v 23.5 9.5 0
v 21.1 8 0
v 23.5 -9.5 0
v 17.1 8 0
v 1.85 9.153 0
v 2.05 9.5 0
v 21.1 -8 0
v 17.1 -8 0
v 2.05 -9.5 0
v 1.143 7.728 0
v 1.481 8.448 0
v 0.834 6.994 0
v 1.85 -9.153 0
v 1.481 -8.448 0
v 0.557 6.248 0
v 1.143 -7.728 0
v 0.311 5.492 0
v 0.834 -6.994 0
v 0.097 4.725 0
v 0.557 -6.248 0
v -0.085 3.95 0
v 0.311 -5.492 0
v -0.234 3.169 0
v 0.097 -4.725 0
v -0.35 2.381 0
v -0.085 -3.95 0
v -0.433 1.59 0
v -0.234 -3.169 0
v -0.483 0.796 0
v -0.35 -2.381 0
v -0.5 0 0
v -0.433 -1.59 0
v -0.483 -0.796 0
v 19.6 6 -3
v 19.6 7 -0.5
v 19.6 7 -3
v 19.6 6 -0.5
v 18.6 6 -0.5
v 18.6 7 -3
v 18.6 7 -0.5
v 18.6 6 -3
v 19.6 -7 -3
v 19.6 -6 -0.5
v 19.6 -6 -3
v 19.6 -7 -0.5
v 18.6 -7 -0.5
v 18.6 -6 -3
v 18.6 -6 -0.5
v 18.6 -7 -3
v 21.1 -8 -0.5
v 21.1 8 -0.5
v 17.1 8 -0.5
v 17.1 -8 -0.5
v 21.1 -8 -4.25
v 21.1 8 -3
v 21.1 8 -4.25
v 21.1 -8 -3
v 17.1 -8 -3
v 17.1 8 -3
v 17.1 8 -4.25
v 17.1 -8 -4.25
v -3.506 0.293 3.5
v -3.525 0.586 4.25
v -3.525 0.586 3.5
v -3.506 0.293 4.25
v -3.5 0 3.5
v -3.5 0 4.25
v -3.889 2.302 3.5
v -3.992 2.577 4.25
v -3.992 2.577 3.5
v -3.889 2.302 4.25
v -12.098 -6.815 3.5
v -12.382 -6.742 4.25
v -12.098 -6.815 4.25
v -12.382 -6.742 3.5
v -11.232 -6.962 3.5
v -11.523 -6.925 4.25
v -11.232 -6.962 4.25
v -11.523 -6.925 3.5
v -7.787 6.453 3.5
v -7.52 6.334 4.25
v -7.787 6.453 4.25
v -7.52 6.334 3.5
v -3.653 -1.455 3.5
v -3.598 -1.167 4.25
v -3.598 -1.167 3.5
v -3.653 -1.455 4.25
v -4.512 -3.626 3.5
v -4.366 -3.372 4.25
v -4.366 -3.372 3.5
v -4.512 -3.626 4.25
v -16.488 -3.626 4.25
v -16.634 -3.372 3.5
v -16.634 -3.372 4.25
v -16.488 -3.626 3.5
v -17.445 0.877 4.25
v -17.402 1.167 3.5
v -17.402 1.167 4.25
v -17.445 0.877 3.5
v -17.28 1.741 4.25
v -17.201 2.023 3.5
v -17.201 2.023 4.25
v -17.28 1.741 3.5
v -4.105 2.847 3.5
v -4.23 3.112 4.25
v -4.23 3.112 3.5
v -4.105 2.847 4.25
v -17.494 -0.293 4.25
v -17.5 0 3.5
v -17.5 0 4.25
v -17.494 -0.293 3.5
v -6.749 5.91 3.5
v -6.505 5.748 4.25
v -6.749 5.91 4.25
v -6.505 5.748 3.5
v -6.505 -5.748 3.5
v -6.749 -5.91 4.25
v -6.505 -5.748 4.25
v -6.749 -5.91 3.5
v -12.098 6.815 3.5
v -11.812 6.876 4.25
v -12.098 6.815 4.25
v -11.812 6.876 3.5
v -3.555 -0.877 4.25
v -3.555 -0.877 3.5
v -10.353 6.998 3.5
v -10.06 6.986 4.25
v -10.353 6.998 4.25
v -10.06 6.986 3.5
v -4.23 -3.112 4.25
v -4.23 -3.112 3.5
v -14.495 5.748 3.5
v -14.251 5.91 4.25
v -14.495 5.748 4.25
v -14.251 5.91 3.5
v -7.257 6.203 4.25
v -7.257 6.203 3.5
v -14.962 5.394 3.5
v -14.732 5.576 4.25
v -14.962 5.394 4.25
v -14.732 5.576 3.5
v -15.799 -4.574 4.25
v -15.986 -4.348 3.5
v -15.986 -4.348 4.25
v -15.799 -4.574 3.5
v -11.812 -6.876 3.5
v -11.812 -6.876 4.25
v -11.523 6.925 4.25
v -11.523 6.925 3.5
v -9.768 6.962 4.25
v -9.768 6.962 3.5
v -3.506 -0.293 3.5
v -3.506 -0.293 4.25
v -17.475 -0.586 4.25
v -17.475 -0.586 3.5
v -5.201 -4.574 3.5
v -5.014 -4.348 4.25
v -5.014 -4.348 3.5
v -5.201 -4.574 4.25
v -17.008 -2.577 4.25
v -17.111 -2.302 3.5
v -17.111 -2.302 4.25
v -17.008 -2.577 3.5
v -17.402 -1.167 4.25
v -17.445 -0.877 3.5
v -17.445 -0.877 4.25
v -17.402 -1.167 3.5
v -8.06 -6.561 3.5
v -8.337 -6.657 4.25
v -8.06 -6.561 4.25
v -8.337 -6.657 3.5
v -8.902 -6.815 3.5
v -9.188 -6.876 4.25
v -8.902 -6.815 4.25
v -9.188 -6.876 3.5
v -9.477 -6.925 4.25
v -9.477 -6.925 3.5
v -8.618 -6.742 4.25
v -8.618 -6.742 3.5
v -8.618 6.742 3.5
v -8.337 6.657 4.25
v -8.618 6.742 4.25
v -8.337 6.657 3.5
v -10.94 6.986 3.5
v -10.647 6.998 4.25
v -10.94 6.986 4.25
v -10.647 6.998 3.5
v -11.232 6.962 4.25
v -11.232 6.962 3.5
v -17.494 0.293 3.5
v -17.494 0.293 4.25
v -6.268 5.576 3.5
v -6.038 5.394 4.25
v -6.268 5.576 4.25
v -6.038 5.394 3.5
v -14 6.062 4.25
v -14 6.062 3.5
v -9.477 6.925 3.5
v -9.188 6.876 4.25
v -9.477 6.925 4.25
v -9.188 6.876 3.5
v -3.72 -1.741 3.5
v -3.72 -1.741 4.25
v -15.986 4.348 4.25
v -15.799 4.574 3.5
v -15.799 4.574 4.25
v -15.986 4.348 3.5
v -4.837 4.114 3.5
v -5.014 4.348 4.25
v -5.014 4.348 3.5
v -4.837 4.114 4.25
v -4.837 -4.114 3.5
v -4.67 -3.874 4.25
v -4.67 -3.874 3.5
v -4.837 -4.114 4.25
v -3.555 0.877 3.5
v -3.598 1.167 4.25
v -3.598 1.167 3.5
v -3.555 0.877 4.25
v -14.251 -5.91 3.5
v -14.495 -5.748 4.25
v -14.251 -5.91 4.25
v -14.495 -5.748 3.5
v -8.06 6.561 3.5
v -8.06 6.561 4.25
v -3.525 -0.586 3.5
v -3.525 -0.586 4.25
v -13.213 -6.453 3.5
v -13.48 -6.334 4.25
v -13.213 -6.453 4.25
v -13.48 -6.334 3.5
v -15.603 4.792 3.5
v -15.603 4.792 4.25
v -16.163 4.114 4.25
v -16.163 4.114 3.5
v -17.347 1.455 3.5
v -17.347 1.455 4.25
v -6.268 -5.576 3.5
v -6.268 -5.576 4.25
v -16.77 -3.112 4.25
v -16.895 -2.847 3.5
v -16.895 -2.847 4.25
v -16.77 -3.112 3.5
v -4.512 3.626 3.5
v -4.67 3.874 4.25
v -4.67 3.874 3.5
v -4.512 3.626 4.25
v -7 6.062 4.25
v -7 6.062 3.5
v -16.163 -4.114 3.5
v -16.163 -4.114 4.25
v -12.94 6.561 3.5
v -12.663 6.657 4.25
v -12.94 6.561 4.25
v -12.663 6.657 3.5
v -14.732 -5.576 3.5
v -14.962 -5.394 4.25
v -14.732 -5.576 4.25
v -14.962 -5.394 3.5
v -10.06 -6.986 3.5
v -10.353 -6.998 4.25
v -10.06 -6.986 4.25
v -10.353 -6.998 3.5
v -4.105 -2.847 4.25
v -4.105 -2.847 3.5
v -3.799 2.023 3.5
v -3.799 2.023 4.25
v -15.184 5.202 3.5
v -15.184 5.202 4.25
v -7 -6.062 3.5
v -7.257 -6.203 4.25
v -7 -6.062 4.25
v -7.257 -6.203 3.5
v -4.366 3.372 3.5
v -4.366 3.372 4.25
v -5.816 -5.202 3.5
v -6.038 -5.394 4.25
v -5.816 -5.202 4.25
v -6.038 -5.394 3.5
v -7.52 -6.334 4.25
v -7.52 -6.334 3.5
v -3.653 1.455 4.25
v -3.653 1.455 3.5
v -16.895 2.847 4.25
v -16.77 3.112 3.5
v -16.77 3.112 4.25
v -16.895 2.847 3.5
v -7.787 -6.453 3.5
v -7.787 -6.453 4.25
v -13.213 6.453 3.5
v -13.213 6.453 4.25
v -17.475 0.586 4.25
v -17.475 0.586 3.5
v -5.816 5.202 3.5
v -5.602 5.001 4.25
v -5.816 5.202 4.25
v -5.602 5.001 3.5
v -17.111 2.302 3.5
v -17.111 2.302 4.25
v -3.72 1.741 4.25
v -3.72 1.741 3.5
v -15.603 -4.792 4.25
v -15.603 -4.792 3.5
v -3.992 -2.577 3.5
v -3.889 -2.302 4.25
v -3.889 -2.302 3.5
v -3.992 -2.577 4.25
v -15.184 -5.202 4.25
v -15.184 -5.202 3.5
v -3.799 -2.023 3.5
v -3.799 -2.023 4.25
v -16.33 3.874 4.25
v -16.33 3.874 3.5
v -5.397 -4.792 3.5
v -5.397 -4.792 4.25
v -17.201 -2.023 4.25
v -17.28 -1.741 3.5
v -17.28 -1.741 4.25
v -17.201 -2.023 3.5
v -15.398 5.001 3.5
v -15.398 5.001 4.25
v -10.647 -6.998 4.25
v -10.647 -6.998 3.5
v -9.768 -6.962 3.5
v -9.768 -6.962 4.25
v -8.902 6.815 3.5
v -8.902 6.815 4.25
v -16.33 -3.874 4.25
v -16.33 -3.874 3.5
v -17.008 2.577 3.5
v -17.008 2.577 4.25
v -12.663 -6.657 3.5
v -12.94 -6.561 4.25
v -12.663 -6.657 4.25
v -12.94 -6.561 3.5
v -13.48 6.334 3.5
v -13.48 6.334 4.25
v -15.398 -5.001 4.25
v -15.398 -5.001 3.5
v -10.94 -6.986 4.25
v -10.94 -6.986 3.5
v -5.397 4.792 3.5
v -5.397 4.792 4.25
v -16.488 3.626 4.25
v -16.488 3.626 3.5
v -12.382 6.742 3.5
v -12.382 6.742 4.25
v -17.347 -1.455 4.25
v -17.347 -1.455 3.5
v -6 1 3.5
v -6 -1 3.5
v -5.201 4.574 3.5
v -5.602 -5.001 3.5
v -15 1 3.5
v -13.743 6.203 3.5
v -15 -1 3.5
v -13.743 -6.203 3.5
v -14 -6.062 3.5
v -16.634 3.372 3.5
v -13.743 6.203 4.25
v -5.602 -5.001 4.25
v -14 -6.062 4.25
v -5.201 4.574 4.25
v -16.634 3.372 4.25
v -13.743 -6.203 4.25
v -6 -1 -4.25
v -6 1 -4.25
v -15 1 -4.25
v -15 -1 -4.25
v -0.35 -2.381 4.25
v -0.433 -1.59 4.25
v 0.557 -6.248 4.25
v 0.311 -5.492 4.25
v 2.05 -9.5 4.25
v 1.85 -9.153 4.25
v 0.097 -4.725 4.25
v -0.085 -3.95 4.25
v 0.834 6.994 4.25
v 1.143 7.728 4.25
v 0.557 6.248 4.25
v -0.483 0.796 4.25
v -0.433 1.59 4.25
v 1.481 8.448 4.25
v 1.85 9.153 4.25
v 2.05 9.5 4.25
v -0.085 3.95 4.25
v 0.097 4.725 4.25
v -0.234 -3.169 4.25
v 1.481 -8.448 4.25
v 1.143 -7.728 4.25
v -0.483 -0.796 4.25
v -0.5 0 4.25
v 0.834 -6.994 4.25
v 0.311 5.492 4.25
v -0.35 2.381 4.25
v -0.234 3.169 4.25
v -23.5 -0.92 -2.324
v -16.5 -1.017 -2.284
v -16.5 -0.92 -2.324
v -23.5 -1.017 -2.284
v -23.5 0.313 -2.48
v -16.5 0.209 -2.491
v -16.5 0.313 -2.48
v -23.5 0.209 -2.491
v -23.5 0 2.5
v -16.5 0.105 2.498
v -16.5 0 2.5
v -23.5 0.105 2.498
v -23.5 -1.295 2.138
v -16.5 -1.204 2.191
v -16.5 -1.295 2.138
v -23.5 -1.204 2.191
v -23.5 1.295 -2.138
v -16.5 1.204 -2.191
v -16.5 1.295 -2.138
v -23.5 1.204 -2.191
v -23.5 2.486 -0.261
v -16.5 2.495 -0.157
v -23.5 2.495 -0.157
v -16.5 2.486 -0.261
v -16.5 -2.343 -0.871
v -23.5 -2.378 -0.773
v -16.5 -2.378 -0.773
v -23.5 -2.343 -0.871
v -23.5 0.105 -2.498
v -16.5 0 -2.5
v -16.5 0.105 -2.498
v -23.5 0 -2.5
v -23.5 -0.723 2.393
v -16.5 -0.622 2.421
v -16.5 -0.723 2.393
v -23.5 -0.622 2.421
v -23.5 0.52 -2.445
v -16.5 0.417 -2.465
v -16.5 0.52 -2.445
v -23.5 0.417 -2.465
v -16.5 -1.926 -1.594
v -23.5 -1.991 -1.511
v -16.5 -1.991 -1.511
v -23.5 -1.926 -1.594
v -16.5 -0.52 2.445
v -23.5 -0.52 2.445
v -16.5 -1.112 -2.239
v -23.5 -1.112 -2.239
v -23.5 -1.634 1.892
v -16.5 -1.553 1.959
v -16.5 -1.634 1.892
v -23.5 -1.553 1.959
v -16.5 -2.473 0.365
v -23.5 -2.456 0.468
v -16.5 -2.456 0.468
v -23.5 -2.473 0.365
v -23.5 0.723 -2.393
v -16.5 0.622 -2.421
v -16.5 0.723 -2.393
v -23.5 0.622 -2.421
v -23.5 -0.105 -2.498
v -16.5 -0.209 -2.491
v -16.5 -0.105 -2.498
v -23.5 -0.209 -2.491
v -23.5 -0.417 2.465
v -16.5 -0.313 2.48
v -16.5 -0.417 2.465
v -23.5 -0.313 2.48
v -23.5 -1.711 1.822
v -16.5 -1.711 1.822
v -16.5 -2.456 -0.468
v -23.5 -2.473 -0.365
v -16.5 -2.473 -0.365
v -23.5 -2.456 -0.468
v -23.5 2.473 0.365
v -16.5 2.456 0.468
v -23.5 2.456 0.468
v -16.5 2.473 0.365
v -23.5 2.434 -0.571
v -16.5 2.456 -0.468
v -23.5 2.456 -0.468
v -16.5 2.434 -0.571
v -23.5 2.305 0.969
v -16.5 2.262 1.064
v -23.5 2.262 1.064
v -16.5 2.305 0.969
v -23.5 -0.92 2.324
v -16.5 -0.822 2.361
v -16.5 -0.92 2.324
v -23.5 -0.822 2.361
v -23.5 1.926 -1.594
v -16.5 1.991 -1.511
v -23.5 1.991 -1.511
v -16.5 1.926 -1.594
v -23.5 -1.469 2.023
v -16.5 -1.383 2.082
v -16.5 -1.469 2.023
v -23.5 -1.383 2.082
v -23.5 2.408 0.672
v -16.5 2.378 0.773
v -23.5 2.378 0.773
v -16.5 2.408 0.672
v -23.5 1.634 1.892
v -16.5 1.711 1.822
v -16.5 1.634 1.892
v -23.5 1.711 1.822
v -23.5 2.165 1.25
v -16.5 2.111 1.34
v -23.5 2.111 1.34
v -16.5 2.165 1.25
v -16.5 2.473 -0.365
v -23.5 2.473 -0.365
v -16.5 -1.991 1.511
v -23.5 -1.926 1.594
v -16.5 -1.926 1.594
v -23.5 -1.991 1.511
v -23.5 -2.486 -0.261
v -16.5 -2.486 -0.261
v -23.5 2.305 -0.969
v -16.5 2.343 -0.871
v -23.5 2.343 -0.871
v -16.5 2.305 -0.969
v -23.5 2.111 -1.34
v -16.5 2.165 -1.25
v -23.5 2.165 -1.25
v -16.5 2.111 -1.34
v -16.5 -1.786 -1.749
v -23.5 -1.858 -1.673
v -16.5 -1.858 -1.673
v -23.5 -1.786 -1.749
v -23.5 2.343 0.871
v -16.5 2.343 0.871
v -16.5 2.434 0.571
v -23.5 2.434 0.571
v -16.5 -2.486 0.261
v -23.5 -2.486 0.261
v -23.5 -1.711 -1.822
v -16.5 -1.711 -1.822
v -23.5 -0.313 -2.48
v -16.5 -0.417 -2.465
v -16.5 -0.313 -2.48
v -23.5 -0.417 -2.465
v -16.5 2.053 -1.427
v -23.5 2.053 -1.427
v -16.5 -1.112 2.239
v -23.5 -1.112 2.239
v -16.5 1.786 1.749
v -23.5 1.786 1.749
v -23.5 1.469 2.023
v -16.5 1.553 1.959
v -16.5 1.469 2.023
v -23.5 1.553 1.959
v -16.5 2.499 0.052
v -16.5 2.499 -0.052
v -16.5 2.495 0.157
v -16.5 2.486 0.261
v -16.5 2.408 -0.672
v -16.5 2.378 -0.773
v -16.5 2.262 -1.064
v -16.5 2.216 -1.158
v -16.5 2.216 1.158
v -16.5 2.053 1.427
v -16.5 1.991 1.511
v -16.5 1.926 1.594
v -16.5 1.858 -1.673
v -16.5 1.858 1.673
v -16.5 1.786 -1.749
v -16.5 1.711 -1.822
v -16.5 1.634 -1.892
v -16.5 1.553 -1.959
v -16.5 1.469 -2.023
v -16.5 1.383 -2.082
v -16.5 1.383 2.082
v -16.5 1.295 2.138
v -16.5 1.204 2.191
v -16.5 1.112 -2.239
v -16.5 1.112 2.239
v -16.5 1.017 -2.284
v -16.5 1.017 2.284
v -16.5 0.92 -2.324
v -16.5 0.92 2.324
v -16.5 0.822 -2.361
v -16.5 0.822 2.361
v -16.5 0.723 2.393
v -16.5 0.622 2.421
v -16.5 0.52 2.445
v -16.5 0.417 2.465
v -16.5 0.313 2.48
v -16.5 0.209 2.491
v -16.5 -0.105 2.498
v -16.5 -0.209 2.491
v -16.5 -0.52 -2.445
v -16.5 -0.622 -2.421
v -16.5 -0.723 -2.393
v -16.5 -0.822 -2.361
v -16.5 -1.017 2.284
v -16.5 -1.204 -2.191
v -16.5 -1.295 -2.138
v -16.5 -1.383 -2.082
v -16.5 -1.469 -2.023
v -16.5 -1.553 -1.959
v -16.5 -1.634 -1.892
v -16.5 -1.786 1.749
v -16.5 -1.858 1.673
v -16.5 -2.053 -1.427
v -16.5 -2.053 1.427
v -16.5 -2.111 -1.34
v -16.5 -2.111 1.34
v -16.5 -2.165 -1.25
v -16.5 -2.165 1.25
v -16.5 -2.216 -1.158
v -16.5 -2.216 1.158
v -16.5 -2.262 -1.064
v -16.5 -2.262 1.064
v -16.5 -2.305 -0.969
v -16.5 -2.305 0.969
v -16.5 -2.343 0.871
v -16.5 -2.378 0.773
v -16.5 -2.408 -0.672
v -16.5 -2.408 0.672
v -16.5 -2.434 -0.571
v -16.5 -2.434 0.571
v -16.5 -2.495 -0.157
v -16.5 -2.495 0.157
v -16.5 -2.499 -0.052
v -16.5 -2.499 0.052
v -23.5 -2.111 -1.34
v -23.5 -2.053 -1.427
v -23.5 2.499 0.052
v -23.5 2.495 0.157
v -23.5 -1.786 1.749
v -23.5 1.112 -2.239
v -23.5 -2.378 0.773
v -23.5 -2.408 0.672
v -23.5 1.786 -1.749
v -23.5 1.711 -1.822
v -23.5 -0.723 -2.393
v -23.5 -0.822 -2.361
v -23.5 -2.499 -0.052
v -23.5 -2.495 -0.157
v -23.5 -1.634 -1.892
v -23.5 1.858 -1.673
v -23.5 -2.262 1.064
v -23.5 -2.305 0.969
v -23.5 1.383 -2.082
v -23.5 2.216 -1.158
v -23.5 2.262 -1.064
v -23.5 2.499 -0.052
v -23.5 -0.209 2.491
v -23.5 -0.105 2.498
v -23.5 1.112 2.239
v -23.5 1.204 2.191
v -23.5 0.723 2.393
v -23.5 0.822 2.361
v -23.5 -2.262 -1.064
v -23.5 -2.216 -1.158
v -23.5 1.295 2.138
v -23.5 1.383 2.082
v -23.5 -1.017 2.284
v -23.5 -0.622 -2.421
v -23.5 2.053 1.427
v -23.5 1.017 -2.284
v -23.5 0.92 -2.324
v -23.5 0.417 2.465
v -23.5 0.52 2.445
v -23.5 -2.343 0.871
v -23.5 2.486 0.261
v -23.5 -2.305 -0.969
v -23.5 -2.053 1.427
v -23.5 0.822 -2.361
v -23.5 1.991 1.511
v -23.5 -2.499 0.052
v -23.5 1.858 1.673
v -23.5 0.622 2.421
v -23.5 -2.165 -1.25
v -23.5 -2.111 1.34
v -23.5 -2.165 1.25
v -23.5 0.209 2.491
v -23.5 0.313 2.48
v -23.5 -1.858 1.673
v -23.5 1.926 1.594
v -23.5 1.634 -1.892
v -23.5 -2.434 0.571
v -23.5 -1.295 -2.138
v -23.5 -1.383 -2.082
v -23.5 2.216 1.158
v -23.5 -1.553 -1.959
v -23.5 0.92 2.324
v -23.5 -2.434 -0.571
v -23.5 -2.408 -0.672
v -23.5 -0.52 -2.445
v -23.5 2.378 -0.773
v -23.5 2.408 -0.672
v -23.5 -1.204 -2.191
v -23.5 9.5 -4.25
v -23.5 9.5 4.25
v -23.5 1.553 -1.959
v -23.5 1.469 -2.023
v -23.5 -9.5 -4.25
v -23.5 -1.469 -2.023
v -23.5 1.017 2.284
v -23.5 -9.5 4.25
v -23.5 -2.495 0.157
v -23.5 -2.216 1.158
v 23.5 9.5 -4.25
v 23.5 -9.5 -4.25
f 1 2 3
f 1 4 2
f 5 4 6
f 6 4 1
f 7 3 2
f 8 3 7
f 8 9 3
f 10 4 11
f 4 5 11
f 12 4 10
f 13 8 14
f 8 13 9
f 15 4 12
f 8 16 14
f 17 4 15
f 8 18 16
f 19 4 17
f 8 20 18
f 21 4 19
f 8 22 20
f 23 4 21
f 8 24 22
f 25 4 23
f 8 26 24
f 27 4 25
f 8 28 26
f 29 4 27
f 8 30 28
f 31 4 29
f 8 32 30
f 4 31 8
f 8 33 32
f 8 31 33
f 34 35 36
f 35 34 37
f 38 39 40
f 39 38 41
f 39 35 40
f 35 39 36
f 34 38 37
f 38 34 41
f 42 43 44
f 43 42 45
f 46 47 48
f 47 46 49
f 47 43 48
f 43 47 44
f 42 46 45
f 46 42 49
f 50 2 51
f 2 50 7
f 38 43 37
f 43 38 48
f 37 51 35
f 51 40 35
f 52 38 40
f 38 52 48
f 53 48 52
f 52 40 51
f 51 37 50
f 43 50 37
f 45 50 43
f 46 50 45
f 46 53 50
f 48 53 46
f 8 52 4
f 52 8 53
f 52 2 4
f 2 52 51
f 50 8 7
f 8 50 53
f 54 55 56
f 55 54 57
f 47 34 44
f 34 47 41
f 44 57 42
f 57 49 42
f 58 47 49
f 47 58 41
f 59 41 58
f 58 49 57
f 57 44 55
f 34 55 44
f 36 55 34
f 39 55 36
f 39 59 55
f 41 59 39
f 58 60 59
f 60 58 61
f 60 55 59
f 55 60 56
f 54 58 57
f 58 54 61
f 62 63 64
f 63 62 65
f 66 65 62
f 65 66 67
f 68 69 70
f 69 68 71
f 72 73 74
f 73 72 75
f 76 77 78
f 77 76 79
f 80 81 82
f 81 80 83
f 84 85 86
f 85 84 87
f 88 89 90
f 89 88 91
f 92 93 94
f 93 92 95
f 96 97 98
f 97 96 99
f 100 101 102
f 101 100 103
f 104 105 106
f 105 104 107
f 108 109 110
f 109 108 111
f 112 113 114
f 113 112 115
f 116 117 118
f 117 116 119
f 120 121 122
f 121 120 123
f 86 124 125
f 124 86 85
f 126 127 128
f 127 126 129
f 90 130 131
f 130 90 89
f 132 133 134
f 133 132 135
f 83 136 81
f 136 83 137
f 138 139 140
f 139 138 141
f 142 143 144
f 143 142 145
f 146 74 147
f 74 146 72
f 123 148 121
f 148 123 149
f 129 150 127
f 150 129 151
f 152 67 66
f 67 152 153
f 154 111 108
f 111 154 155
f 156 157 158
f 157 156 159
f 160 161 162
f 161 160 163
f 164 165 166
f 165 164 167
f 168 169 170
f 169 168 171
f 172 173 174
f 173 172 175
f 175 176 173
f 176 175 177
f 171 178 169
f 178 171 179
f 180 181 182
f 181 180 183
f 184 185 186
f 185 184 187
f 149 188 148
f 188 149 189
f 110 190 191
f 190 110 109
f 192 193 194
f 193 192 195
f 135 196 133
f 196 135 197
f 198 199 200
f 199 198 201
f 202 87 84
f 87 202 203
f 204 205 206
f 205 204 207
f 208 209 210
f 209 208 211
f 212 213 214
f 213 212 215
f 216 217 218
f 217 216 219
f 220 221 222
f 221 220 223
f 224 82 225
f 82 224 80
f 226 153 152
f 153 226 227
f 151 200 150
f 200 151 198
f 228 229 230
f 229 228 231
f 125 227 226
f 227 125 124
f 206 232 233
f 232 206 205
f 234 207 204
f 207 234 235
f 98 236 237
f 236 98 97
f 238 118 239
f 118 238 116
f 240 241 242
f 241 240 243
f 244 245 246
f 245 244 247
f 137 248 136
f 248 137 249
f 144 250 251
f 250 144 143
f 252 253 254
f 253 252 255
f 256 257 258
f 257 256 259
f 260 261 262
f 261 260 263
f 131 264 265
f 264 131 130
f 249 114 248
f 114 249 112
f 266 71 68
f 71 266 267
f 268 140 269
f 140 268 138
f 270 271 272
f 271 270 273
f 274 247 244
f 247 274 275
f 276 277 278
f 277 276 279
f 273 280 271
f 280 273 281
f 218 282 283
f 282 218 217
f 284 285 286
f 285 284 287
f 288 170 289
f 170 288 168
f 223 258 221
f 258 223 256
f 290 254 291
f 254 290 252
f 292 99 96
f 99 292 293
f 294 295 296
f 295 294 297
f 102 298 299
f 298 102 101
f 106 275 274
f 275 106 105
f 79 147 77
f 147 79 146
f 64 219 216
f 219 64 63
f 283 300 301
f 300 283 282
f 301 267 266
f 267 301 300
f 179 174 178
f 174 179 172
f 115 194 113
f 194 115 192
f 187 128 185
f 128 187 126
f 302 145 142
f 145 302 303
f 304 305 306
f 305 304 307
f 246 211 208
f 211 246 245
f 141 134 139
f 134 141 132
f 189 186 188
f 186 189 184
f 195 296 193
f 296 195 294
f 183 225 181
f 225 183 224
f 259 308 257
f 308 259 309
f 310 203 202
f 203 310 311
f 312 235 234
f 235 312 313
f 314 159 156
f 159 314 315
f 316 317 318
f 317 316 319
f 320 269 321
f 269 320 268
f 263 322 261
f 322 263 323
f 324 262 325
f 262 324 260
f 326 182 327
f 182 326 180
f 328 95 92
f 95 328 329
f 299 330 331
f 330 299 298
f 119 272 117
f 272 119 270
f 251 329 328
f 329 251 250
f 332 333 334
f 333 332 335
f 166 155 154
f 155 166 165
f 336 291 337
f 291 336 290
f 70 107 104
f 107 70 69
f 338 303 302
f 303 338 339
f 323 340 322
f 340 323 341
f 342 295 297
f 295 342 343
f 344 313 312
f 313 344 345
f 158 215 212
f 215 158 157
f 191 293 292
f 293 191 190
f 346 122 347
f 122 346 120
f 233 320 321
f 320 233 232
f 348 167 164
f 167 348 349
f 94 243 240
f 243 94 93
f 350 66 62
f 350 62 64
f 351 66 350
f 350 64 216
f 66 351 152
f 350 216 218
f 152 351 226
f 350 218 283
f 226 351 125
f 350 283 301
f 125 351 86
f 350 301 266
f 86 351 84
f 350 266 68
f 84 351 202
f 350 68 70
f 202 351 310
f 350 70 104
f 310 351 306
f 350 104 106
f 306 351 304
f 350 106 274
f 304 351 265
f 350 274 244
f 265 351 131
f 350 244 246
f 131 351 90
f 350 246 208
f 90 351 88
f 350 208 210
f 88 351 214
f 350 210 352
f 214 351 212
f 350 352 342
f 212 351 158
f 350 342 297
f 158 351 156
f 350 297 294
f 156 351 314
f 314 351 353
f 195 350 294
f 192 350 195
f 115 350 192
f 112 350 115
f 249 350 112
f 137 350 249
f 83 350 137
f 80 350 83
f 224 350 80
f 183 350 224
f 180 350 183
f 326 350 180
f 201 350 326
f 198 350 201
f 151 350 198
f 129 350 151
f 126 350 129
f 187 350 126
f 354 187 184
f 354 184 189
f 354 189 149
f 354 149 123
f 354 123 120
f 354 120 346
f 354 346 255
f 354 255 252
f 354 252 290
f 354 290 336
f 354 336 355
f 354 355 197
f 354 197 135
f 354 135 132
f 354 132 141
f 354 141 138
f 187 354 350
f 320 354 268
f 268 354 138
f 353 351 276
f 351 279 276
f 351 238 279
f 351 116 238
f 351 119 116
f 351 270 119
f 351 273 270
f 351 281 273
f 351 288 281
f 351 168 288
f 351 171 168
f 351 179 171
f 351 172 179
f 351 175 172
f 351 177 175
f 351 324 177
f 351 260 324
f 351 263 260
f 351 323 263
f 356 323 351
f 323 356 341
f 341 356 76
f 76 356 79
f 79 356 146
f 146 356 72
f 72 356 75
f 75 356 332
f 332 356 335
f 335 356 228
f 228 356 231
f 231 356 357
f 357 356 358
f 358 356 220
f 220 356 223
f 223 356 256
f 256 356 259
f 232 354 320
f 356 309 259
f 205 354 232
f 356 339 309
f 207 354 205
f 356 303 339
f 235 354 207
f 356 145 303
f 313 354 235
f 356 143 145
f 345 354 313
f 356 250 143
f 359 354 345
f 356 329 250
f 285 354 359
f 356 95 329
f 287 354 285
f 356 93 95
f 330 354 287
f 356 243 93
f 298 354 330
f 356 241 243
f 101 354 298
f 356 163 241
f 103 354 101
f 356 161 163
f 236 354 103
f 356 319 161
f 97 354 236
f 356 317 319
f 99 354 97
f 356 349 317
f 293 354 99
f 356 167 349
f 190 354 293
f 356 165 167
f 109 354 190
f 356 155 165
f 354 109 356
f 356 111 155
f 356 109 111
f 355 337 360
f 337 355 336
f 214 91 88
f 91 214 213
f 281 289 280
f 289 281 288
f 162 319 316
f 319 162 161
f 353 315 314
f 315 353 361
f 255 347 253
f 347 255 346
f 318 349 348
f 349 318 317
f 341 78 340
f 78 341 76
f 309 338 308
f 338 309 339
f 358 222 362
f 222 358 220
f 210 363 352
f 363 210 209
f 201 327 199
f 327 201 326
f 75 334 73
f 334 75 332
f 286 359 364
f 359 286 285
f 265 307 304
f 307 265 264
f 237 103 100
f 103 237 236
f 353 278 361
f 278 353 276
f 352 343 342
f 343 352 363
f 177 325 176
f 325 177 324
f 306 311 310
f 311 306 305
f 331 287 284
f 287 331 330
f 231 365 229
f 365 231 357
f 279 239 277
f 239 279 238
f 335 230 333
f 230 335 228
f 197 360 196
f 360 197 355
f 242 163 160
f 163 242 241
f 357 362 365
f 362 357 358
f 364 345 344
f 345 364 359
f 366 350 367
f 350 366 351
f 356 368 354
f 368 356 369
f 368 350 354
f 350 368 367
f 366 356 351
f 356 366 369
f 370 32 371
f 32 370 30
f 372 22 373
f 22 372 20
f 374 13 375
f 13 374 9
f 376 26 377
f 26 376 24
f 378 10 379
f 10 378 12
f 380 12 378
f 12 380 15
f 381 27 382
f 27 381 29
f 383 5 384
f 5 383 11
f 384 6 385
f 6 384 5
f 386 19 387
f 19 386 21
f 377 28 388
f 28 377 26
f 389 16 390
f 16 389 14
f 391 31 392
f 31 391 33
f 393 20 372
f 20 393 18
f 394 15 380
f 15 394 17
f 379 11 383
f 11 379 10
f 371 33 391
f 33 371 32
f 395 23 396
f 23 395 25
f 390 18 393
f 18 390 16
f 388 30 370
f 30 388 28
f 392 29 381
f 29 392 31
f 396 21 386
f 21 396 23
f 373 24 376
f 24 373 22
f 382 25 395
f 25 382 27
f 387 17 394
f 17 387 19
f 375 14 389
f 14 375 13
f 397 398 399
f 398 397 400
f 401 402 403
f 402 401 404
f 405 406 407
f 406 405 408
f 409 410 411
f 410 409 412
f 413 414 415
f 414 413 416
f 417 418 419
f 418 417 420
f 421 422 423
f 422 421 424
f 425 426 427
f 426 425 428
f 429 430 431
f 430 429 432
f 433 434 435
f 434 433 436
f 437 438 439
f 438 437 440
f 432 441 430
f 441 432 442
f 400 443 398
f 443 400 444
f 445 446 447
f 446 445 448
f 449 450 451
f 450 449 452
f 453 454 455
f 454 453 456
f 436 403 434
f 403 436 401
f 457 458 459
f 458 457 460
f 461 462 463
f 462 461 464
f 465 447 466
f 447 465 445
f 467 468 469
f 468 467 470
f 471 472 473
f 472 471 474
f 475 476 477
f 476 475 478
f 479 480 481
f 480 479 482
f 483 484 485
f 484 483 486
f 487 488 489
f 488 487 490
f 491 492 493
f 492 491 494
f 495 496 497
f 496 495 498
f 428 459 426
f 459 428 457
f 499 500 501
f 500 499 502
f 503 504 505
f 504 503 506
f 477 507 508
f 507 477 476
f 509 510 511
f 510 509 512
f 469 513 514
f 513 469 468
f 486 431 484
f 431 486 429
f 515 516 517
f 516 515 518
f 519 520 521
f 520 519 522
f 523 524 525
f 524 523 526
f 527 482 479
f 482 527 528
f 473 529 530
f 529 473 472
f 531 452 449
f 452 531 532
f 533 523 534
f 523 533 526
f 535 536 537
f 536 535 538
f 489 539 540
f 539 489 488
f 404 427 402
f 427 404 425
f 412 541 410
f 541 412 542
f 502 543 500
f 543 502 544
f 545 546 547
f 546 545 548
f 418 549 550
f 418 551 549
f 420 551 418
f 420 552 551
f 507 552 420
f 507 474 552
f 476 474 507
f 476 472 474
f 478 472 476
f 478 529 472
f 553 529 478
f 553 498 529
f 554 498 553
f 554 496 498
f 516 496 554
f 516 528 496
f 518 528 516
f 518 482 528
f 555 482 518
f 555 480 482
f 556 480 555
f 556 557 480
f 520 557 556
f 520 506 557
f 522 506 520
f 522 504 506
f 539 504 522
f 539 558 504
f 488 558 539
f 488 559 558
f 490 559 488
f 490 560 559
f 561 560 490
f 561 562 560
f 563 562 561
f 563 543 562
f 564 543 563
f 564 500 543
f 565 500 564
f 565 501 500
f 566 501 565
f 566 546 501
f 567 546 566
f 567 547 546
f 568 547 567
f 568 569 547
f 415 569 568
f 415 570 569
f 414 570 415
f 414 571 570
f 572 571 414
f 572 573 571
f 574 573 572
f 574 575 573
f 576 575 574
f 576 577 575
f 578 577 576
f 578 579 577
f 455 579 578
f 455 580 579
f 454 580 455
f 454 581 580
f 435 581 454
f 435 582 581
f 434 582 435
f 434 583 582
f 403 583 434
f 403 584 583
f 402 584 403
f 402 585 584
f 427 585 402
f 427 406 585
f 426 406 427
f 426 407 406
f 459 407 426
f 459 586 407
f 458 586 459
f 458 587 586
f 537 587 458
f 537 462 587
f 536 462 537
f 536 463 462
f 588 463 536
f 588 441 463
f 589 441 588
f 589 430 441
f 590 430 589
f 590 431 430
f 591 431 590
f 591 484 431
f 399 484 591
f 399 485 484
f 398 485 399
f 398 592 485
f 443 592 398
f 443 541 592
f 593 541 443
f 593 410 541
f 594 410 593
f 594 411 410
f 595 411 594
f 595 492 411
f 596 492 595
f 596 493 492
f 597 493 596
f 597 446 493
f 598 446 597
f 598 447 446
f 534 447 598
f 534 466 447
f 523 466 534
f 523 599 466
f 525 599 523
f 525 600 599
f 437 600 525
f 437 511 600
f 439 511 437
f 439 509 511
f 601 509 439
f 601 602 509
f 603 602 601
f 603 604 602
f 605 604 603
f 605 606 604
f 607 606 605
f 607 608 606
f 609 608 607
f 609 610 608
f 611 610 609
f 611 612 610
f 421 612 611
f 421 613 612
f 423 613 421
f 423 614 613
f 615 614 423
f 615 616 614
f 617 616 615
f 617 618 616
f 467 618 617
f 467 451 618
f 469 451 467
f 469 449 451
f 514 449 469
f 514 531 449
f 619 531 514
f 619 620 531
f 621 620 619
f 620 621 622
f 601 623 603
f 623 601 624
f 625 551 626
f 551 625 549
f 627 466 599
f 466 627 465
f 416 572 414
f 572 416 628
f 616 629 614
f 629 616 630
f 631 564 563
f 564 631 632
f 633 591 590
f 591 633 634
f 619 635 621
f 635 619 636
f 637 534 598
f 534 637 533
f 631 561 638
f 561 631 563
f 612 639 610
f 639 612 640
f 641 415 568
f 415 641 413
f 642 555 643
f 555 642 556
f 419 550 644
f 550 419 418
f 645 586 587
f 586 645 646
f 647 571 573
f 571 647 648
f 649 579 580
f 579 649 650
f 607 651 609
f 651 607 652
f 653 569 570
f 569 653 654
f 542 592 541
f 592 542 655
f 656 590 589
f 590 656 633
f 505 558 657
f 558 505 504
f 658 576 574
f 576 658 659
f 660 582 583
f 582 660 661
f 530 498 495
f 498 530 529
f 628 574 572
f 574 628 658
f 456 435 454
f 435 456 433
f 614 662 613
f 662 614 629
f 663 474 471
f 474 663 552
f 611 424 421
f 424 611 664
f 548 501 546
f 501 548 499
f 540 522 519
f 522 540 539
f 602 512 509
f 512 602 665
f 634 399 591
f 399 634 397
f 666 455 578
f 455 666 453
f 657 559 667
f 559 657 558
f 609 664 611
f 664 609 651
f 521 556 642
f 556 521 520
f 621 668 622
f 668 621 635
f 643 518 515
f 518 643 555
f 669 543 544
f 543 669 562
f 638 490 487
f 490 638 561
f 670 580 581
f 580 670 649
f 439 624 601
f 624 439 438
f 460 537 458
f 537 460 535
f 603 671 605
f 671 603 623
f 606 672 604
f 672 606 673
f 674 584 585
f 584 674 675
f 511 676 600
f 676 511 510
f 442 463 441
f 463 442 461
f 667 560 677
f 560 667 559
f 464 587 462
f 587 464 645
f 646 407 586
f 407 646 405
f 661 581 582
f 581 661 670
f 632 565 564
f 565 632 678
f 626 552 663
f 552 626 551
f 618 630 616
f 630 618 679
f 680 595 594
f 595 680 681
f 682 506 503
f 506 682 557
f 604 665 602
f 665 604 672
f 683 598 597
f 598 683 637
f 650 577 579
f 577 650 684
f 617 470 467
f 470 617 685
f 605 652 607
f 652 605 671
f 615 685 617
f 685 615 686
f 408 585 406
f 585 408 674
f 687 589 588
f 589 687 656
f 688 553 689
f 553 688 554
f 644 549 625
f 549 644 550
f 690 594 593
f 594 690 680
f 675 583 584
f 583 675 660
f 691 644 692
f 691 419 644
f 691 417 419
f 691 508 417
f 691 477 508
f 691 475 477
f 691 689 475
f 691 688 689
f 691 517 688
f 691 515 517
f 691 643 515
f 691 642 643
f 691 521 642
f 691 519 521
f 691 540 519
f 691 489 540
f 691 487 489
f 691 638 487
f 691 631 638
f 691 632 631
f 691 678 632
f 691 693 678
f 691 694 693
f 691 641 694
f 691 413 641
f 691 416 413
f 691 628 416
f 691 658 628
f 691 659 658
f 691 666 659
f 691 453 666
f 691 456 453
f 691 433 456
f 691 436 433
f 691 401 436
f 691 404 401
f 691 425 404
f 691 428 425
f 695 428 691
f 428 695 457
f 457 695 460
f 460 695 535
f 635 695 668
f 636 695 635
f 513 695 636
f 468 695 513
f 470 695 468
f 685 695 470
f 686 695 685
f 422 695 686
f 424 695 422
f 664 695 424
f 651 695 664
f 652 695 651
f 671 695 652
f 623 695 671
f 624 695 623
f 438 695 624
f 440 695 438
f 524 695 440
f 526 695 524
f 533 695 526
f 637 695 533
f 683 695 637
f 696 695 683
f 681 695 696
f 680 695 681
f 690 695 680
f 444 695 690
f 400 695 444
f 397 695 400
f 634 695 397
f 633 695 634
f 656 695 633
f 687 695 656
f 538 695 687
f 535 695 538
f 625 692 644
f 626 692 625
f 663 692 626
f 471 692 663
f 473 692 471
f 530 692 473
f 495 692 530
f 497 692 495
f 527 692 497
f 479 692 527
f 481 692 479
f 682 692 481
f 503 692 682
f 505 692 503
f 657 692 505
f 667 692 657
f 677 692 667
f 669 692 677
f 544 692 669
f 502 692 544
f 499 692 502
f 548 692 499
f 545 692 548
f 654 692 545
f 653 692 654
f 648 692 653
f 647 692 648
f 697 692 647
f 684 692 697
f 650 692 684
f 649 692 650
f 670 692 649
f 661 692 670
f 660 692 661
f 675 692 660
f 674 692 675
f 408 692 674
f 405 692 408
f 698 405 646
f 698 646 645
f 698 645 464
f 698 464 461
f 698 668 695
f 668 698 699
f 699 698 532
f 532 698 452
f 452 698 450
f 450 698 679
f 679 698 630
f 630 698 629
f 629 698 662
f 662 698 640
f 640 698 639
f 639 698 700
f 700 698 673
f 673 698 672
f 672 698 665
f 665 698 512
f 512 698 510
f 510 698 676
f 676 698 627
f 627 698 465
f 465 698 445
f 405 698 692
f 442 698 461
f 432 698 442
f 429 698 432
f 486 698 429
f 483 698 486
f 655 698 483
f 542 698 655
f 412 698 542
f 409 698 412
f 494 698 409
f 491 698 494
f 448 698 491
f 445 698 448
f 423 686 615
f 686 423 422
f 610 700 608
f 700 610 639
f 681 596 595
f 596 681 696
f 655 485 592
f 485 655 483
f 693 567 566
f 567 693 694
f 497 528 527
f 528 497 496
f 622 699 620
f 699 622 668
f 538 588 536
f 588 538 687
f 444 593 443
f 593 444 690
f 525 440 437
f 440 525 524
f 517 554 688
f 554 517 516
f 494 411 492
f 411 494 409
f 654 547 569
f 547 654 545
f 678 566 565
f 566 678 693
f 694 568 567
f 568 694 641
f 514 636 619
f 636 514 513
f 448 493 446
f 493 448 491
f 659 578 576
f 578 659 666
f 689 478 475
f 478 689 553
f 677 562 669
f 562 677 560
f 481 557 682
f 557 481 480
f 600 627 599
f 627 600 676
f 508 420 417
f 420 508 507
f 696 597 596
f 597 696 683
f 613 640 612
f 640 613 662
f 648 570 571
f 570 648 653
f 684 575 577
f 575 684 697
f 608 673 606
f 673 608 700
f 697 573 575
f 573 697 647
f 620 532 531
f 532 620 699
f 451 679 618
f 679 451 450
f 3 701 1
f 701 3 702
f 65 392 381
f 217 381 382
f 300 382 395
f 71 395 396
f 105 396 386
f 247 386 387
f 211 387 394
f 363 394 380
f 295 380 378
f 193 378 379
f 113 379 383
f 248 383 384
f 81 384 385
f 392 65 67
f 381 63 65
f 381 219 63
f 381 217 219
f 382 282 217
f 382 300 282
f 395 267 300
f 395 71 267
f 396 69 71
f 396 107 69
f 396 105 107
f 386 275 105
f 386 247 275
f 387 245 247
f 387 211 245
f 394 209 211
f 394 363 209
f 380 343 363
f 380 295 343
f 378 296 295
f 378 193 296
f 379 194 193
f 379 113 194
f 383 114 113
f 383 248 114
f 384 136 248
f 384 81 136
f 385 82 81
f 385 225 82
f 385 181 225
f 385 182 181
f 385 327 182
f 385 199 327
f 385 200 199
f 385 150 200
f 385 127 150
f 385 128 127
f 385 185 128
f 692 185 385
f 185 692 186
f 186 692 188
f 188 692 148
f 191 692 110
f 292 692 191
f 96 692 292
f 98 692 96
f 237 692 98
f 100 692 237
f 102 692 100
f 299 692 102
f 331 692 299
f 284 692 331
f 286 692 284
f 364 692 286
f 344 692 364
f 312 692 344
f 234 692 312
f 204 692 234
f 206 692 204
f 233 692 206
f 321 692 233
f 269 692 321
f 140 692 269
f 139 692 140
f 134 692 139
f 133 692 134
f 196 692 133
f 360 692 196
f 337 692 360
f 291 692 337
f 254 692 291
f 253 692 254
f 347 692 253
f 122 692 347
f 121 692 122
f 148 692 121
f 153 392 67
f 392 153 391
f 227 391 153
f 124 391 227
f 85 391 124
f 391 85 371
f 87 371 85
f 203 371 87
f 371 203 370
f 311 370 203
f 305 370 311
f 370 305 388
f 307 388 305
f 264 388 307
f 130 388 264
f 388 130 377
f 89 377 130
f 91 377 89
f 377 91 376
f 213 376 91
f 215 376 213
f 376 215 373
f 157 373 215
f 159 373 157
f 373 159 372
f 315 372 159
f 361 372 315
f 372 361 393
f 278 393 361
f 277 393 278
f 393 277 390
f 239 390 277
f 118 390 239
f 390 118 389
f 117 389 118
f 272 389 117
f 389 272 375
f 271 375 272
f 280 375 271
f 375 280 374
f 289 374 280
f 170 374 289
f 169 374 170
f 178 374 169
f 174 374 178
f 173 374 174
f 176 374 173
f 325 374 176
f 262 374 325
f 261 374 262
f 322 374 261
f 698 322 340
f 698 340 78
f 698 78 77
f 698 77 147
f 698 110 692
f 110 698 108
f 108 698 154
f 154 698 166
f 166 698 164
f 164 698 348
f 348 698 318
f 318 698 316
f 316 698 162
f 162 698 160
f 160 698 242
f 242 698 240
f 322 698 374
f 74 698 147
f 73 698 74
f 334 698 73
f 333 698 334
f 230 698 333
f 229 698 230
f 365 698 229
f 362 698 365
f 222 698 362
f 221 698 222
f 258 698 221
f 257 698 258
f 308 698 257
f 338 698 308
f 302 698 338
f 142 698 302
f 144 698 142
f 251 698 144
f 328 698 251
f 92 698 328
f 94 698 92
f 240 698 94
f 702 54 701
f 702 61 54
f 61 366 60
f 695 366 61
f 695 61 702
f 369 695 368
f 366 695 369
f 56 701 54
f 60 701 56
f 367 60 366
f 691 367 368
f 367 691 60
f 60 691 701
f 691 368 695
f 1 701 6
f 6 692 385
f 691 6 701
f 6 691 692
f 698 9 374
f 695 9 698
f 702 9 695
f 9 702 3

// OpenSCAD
$fn=150;

difference(){
    cube([47,19,8.5], center=true); //main body 
        
    union(){
        color ("red") translate([27/2,0,5/2])cube([20,19,5], center=true); //madylko
        color ("red") translate([47/2-4.4,19/2-3,0])cube([1,1,20], center=true); //hole1
        color ("red") translate([47/2-4.4,-19/2+3,0])cube([1,1,20], center=true); //hole2
        color ("red") translate([47/2-4.4,0,1])cube([4,16,3], center=true); //snizeni u hole1 a hole2 zeshora
        color ("red") translate([47/2-4.4,0,-5/2-2])cube([4,16,3], center=true); //snizeni u hole1 a hole2 zespoda
        color ("red") translate([-47/2+4+9,0,6])cylinder(h=5, r=7, center=true); //ozdoba za zamecek
        color ("red") translate([-47/2+4+9,0,0])cube([9,2,15], center=true); //fake klicenka
        color ("red") translate([27/2+5,0,5/2])cylinder(h=5, r=19, center=true); //vykrojeni madla
        color ("red") translate([-27/2-6.5,0,0])rotate([0,90,0])cylinder(h=7, r=2.5, center=true);  //vodici dira vepredu nalezato

    }//union
    
}//difference

//color ("red") translate([-47/2+4+9,0,2])cube([9,2,2], center=true); //fake klicenka
